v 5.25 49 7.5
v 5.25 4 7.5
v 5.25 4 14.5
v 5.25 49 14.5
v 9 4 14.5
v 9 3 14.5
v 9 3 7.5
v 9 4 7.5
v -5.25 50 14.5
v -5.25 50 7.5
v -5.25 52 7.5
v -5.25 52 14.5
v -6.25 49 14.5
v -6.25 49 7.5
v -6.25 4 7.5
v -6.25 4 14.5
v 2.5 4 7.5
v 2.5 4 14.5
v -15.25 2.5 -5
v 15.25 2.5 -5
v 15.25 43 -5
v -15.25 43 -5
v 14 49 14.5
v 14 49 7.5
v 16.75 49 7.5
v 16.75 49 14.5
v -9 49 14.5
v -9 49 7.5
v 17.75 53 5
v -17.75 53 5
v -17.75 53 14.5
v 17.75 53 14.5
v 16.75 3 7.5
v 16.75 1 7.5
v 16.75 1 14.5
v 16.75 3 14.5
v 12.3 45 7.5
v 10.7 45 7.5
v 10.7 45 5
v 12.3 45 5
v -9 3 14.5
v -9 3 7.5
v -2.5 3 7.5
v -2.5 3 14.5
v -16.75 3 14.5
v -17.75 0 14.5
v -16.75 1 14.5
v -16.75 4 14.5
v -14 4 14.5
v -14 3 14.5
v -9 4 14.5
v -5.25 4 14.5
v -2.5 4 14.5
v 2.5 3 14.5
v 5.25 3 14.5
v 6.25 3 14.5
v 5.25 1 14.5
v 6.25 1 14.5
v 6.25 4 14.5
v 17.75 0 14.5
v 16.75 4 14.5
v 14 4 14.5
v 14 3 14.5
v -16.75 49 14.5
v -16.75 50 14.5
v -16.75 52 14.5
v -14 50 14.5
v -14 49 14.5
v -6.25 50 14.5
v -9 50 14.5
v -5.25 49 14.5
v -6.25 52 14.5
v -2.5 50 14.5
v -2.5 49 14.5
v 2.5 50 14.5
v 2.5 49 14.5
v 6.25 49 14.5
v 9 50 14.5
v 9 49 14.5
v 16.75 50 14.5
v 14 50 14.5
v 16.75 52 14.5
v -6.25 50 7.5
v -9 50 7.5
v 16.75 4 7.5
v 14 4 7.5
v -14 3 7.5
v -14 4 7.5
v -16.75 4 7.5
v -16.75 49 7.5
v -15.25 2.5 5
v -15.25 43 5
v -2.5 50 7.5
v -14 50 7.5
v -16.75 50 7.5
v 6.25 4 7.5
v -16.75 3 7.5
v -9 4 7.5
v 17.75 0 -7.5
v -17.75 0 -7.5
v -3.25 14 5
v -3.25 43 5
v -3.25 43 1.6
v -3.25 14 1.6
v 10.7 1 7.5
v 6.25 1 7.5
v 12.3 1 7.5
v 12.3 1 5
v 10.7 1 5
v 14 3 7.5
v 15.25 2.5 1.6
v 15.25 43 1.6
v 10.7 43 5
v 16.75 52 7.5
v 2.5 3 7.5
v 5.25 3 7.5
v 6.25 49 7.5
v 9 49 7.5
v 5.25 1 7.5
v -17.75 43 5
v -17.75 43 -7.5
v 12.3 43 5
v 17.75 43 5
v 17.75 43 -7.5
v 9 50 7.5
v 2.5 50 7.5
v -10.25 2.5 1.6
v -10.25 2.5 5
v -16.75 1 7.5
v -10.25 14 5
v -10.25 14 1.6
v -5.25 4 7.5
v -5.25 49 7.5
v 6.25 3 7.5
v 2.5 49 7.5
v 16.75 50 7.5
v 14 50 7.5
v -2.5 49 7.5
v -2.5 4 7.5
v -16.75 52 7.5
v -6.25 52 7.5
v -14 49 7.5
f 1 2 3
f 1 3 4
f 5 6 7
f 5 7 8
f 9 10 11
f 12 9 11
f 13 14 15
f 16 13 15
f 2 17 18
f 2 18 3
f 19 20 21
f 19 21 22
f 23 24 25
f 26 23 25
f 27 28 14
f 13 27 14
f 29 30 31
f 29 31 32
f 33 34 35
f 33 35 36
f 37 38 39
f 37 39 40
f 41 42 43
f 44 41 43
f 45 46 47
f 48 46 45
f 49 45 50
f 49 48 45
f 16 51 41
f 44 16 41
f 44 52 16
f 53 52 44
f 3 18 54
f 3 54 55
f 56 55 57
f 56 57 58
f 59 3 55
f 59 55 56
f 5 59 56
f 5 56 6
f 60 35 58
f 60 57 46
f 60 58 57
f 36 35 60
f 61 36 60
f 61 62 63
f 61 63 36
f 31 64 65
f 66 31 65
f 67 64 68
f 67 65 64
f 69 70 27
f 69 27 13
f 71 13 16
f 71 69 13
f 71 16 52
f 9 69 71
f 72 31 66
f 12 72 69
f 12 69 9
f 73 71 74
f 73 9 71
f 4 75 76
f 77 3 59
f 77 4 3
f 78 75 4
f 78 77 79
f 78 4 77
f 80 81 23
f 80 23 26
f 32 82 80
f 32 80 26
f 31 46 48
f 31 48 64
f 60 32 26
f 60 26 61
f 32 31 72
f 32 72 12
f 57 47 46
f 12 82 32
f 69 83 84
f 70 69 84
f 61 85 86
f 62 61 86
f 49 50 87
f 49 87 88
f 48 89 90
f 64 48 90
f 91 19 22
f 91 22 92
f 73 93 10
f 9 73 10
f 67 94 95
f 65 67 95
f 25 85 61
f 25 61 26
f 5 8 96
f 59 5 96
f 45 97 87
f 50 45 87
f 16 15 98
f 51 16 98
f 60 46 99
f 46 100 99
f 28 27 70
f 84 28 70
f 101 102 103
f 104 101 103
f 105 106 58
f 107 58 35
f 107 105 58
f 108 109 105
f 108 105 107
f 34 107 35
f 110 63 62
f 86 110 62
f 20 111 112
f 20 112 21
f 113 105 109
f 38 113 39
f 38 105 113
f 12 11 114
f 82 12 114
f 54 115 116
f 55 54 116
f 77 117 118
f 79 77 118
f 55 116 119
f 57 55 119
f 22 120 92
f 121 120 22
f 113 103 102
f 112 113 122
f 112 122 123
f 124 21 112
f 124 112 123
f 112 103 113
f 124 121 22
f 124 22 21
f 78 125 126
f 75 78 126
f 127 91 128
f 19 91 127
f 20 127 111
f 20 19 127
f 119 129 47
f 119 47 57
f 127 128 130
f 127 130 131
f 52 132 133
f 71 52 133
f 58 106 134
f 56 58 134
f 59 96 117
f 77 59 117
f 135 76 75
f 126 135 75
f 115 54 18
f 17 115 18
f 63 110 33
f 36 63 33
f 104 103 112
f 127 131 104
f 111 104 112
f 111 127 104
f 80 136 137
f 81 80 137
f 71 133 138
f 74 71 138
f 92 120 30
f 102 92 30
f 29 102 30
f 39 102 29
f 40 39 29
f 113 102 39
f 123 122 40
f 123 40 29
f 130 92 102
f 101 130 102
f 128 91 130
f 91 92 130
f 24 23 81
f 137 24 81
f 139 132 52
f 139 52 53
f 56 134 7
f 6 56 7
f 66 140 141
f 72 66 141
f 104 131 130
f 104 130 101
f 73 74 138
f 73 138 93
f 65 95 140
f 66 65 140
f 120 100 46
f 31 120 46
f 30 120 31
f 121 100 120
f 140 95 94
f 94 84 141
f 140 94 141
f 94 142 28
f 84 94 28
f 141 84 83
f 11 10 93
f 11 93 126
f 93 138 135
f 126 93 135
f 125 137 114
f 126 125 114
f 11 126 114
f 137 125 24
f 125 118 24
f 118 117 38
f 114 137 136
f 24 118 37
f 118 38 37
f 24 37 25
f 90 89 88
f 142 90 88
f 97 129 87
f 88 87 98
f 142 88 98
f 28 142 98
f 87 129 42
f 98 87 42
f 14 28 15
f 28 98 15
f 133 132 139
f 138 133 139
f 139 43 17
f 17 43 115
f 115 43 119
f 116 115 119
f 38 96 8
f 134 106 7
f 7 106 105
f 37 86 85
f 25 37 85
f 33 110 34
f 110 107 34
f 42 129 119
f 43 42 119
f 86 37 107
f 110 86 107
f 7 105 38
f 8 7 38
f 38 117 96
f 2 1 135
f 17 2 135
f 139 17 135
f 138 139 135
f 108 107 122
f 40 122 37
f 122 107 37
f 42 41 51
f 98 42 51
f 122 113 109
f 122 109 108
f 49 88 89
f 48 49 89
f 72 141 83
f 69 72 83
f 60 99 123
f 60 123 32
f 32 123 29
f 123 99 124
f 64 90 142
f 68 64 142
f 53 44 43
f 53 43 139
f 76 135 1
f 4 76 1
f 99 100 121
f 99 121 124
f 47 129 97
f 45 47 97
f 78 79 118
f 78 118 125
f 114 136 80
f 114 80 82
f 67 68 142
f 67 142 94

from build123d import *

# Parameters (mm, degrees)
SKETCH1_W           = 30.5
SKETCH1_H           = 10
BOSS_EXTRUDE1_DEPTH = 2.5
SKETCH2_W           = 35.5
SKETCH2_H           = 15
BOSS_EXTRUDE3_DEPTH = 43
SKETCH3_W           = 7
SKETCH3_H           = 3.4
CUT_EXTRUDE1_DEPTH  = 29
SKETCH4_W           = 35.5
SKETCH4_H           = 2.5
BOSS_EXTRUDE4_DEPTH = 10
SKETCH5_W           = 35.5
SKETCH5_H           = 53
SKETCH5_W_2         = 33.5
SKETCH5_H_2         = 51
BOSS_EXTRUDE5_DEPTH = 7
SKETCH6_W           = 10.5
SKETCH6_H           = 45
BOSS_EXTRUDE6_DEPTH = 7
SKETCH7_W           = 5
SKETCH7_H           = 1
SKETCH7_W_2         = 1
SKETCH7_H_2         = 2
CUT_EXTRUDE2_DEPTH  = 7
SKETCH8_W           = 1.6
SKETCH8_H           = 44
CUT_EXTRUDE3_DEPTH  = 2.5


with BuildPart() as part:
    # Sketch1 → Boss-Extrude1 (new body)
    with BuildSketch(Plane(origin=(0, 0, 0), x_dir=(1, 0, 0), z_dir=(0, 1, 0))):
        Rectangle(SKETCH1_W, SKETCH1_H)
    extrude(amount=BOSS_EXTRUDE1_DEPTH)

    # Sketch2 → Boss-Extrude3 (add)
    with BuildSketch(Plane(origin=(0, 0, 0), x_dir=(1, 0, 0), z_dir=(0, 1, 0))):
        Rectangle(SKETCH2_W, SKETCH2_H)
        Polygon((-15.25, 5), (-15.25, -5), (-10.25, -5), (-10.25, -1.6), (15.25, -1.6), (15.25, 5), align=None, mode=Mode.SUBTRACT)
    extrude(amount=BOSS_EXTRUDE3_DEPTH)

    # Sketch3 → Cut-Extrude1 (cut)
    with BuildSketch(Plane(origin=(0, 43, 0), x_dir=(1, 0, 0), z_dir=(0, 1, 0))):
        with Locations((-6.75, -3.3)):
            Rectangle(SKETCH3_W, SKETCH3_H)
    extrude(amount=-CUT_EXTRUDE1_DEPTH, mode=Mode.SUBTRACT)

    # Sketch4 → Boss-Extrude4 (add)
    with BuildSketch(Plane(origin=(0, 43, 0), x_dir=(1, 0, 0), z_dir=(0, 1, 0))):
        with Locations((0, -6.25)):
            Rectangle(SKETCH4_W, SKETCH4_H)
    extrude(amount=BOSS_EXTRUDE4_DEPTH)

    # Sketch5 → Boss-Extrude5 (add)
    with BuildSketch(Plane.XY.offset(7.5)):
        with Locations((0, 26.5)):
            Rectangle(SKETCH5_W, SKETCH5_H)
        with Locations((0, 26.5)):
            Rectangle(SKETCH5_W_2, SKETCH5_H_2, mode=Mode.SUBTRACT)
    extrude(amount=BOSS_EXTRUDE5_DEPTH)

    # Sketch6 → Boss-Extrude6 (add)
    with BuildSketch(Plane.XY.offset(7.5)):
        Polygon((-6.25, 52), (-6.25, 50), (-16.75, 50), (-16.75, 49), (-6.25, 49), (-6.25, 4), (-16.75, 4), (-16.75, 3), (-6.25, 3), (-6.25, 1), (-5.25, 1), (-5.25, 3), (5.25, 3), (5.25, 1), (6.25, 1), (6.25, 3), (16.75, 3), (16.75, 4), (6.25, 4), (6.25, 49), (16.75, 49), (16.75, 50), (6.25, 50), (6.25, 52), (5.25, 52), (5.25, 50), (-5.25, 50), (-5.25, 52), align=None)
        with Locations((0, 26.5)):
            Rectangle(SKETCH6_W, SKETCH6_H, mode=Mode.SUBTRACT)
    extrude(amount=BOSS_EXTRUDE6_DEPTH)

    # Sketch7 → Cut-Extrude2 (cut)
    with BuildSketch(Plane.XY.offset(14.5)):
        with Locations((0, 49.5)):
            Rectangle(SKETCH7_W, SKETCH7_H)
        with Locations((-11.5, 49.5)):
            Rectangle(SKETCH7_W, SKETCH7_H)
        with Locations((11.5, 49.5)):
            Rectangle(SKETCH7_W, SKETCH7_H)
        with Locations((11.5, 3.5)):
            Rectangle(SKETCH7_W, SKETCH7_H)
        with Locations((5.75, 51)):
            Rectangle(SKETCH7_W_2, SKETCH7_H_2)
        with Locations((0, 3.5)):
            Rectangle(SKETCH7_W, SKETCH7_H)
        with Locations((-11.5, 3.5)):
            Rectangle(SKETCH7_W, SKETCH7_H)
        with Locations((-5.75, 2)):
            Rectangle(SKETCH7_W_2, SKETCH7_H_2)
    extrude(amount=-CUT_EXTRUDE2_DEPTH, mode=Mode.SUBTRACT)

    # Sketch8 → Cut-Extrude3 (cut)
    with BuildSketch(Plane.XY.offset(7.5)):
        with Locations((11.5, 23)):
            Rectangle(SKETCH8_W, SKETCH8_H)
    extrude(amount=-CUT_EXTRUDE3_DEPTH, mode=Mode.SUBTRACT)


solid = part.part
